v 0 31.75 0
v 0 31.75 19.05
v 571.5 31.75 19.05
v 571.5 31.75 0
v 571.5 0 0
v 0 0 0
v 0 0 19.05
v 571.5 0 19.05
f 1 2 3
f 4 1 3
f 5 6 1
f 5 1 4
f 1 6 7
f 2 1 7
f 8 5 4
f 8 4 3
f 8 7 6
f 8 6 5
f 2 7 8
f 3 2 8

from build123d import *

# Parameters (mm, degrees)
F0_W     = 571.5
F0_H     = 19.05
F1_DEPTH = 31.75


with BuildPart() as f1:
    # F0 (on Front) → F1 (new body)
    with BuildSketch(Plane.XZ):
        with Locations((285.75, 9.525)):
            Rectangle(F0_W, F0_H)
    extrude(amount=-F1_DEPTH)


with BuildPart() as f2_1:
    # F2: copy of F1
    add(f1.part)


solid = f1.part
